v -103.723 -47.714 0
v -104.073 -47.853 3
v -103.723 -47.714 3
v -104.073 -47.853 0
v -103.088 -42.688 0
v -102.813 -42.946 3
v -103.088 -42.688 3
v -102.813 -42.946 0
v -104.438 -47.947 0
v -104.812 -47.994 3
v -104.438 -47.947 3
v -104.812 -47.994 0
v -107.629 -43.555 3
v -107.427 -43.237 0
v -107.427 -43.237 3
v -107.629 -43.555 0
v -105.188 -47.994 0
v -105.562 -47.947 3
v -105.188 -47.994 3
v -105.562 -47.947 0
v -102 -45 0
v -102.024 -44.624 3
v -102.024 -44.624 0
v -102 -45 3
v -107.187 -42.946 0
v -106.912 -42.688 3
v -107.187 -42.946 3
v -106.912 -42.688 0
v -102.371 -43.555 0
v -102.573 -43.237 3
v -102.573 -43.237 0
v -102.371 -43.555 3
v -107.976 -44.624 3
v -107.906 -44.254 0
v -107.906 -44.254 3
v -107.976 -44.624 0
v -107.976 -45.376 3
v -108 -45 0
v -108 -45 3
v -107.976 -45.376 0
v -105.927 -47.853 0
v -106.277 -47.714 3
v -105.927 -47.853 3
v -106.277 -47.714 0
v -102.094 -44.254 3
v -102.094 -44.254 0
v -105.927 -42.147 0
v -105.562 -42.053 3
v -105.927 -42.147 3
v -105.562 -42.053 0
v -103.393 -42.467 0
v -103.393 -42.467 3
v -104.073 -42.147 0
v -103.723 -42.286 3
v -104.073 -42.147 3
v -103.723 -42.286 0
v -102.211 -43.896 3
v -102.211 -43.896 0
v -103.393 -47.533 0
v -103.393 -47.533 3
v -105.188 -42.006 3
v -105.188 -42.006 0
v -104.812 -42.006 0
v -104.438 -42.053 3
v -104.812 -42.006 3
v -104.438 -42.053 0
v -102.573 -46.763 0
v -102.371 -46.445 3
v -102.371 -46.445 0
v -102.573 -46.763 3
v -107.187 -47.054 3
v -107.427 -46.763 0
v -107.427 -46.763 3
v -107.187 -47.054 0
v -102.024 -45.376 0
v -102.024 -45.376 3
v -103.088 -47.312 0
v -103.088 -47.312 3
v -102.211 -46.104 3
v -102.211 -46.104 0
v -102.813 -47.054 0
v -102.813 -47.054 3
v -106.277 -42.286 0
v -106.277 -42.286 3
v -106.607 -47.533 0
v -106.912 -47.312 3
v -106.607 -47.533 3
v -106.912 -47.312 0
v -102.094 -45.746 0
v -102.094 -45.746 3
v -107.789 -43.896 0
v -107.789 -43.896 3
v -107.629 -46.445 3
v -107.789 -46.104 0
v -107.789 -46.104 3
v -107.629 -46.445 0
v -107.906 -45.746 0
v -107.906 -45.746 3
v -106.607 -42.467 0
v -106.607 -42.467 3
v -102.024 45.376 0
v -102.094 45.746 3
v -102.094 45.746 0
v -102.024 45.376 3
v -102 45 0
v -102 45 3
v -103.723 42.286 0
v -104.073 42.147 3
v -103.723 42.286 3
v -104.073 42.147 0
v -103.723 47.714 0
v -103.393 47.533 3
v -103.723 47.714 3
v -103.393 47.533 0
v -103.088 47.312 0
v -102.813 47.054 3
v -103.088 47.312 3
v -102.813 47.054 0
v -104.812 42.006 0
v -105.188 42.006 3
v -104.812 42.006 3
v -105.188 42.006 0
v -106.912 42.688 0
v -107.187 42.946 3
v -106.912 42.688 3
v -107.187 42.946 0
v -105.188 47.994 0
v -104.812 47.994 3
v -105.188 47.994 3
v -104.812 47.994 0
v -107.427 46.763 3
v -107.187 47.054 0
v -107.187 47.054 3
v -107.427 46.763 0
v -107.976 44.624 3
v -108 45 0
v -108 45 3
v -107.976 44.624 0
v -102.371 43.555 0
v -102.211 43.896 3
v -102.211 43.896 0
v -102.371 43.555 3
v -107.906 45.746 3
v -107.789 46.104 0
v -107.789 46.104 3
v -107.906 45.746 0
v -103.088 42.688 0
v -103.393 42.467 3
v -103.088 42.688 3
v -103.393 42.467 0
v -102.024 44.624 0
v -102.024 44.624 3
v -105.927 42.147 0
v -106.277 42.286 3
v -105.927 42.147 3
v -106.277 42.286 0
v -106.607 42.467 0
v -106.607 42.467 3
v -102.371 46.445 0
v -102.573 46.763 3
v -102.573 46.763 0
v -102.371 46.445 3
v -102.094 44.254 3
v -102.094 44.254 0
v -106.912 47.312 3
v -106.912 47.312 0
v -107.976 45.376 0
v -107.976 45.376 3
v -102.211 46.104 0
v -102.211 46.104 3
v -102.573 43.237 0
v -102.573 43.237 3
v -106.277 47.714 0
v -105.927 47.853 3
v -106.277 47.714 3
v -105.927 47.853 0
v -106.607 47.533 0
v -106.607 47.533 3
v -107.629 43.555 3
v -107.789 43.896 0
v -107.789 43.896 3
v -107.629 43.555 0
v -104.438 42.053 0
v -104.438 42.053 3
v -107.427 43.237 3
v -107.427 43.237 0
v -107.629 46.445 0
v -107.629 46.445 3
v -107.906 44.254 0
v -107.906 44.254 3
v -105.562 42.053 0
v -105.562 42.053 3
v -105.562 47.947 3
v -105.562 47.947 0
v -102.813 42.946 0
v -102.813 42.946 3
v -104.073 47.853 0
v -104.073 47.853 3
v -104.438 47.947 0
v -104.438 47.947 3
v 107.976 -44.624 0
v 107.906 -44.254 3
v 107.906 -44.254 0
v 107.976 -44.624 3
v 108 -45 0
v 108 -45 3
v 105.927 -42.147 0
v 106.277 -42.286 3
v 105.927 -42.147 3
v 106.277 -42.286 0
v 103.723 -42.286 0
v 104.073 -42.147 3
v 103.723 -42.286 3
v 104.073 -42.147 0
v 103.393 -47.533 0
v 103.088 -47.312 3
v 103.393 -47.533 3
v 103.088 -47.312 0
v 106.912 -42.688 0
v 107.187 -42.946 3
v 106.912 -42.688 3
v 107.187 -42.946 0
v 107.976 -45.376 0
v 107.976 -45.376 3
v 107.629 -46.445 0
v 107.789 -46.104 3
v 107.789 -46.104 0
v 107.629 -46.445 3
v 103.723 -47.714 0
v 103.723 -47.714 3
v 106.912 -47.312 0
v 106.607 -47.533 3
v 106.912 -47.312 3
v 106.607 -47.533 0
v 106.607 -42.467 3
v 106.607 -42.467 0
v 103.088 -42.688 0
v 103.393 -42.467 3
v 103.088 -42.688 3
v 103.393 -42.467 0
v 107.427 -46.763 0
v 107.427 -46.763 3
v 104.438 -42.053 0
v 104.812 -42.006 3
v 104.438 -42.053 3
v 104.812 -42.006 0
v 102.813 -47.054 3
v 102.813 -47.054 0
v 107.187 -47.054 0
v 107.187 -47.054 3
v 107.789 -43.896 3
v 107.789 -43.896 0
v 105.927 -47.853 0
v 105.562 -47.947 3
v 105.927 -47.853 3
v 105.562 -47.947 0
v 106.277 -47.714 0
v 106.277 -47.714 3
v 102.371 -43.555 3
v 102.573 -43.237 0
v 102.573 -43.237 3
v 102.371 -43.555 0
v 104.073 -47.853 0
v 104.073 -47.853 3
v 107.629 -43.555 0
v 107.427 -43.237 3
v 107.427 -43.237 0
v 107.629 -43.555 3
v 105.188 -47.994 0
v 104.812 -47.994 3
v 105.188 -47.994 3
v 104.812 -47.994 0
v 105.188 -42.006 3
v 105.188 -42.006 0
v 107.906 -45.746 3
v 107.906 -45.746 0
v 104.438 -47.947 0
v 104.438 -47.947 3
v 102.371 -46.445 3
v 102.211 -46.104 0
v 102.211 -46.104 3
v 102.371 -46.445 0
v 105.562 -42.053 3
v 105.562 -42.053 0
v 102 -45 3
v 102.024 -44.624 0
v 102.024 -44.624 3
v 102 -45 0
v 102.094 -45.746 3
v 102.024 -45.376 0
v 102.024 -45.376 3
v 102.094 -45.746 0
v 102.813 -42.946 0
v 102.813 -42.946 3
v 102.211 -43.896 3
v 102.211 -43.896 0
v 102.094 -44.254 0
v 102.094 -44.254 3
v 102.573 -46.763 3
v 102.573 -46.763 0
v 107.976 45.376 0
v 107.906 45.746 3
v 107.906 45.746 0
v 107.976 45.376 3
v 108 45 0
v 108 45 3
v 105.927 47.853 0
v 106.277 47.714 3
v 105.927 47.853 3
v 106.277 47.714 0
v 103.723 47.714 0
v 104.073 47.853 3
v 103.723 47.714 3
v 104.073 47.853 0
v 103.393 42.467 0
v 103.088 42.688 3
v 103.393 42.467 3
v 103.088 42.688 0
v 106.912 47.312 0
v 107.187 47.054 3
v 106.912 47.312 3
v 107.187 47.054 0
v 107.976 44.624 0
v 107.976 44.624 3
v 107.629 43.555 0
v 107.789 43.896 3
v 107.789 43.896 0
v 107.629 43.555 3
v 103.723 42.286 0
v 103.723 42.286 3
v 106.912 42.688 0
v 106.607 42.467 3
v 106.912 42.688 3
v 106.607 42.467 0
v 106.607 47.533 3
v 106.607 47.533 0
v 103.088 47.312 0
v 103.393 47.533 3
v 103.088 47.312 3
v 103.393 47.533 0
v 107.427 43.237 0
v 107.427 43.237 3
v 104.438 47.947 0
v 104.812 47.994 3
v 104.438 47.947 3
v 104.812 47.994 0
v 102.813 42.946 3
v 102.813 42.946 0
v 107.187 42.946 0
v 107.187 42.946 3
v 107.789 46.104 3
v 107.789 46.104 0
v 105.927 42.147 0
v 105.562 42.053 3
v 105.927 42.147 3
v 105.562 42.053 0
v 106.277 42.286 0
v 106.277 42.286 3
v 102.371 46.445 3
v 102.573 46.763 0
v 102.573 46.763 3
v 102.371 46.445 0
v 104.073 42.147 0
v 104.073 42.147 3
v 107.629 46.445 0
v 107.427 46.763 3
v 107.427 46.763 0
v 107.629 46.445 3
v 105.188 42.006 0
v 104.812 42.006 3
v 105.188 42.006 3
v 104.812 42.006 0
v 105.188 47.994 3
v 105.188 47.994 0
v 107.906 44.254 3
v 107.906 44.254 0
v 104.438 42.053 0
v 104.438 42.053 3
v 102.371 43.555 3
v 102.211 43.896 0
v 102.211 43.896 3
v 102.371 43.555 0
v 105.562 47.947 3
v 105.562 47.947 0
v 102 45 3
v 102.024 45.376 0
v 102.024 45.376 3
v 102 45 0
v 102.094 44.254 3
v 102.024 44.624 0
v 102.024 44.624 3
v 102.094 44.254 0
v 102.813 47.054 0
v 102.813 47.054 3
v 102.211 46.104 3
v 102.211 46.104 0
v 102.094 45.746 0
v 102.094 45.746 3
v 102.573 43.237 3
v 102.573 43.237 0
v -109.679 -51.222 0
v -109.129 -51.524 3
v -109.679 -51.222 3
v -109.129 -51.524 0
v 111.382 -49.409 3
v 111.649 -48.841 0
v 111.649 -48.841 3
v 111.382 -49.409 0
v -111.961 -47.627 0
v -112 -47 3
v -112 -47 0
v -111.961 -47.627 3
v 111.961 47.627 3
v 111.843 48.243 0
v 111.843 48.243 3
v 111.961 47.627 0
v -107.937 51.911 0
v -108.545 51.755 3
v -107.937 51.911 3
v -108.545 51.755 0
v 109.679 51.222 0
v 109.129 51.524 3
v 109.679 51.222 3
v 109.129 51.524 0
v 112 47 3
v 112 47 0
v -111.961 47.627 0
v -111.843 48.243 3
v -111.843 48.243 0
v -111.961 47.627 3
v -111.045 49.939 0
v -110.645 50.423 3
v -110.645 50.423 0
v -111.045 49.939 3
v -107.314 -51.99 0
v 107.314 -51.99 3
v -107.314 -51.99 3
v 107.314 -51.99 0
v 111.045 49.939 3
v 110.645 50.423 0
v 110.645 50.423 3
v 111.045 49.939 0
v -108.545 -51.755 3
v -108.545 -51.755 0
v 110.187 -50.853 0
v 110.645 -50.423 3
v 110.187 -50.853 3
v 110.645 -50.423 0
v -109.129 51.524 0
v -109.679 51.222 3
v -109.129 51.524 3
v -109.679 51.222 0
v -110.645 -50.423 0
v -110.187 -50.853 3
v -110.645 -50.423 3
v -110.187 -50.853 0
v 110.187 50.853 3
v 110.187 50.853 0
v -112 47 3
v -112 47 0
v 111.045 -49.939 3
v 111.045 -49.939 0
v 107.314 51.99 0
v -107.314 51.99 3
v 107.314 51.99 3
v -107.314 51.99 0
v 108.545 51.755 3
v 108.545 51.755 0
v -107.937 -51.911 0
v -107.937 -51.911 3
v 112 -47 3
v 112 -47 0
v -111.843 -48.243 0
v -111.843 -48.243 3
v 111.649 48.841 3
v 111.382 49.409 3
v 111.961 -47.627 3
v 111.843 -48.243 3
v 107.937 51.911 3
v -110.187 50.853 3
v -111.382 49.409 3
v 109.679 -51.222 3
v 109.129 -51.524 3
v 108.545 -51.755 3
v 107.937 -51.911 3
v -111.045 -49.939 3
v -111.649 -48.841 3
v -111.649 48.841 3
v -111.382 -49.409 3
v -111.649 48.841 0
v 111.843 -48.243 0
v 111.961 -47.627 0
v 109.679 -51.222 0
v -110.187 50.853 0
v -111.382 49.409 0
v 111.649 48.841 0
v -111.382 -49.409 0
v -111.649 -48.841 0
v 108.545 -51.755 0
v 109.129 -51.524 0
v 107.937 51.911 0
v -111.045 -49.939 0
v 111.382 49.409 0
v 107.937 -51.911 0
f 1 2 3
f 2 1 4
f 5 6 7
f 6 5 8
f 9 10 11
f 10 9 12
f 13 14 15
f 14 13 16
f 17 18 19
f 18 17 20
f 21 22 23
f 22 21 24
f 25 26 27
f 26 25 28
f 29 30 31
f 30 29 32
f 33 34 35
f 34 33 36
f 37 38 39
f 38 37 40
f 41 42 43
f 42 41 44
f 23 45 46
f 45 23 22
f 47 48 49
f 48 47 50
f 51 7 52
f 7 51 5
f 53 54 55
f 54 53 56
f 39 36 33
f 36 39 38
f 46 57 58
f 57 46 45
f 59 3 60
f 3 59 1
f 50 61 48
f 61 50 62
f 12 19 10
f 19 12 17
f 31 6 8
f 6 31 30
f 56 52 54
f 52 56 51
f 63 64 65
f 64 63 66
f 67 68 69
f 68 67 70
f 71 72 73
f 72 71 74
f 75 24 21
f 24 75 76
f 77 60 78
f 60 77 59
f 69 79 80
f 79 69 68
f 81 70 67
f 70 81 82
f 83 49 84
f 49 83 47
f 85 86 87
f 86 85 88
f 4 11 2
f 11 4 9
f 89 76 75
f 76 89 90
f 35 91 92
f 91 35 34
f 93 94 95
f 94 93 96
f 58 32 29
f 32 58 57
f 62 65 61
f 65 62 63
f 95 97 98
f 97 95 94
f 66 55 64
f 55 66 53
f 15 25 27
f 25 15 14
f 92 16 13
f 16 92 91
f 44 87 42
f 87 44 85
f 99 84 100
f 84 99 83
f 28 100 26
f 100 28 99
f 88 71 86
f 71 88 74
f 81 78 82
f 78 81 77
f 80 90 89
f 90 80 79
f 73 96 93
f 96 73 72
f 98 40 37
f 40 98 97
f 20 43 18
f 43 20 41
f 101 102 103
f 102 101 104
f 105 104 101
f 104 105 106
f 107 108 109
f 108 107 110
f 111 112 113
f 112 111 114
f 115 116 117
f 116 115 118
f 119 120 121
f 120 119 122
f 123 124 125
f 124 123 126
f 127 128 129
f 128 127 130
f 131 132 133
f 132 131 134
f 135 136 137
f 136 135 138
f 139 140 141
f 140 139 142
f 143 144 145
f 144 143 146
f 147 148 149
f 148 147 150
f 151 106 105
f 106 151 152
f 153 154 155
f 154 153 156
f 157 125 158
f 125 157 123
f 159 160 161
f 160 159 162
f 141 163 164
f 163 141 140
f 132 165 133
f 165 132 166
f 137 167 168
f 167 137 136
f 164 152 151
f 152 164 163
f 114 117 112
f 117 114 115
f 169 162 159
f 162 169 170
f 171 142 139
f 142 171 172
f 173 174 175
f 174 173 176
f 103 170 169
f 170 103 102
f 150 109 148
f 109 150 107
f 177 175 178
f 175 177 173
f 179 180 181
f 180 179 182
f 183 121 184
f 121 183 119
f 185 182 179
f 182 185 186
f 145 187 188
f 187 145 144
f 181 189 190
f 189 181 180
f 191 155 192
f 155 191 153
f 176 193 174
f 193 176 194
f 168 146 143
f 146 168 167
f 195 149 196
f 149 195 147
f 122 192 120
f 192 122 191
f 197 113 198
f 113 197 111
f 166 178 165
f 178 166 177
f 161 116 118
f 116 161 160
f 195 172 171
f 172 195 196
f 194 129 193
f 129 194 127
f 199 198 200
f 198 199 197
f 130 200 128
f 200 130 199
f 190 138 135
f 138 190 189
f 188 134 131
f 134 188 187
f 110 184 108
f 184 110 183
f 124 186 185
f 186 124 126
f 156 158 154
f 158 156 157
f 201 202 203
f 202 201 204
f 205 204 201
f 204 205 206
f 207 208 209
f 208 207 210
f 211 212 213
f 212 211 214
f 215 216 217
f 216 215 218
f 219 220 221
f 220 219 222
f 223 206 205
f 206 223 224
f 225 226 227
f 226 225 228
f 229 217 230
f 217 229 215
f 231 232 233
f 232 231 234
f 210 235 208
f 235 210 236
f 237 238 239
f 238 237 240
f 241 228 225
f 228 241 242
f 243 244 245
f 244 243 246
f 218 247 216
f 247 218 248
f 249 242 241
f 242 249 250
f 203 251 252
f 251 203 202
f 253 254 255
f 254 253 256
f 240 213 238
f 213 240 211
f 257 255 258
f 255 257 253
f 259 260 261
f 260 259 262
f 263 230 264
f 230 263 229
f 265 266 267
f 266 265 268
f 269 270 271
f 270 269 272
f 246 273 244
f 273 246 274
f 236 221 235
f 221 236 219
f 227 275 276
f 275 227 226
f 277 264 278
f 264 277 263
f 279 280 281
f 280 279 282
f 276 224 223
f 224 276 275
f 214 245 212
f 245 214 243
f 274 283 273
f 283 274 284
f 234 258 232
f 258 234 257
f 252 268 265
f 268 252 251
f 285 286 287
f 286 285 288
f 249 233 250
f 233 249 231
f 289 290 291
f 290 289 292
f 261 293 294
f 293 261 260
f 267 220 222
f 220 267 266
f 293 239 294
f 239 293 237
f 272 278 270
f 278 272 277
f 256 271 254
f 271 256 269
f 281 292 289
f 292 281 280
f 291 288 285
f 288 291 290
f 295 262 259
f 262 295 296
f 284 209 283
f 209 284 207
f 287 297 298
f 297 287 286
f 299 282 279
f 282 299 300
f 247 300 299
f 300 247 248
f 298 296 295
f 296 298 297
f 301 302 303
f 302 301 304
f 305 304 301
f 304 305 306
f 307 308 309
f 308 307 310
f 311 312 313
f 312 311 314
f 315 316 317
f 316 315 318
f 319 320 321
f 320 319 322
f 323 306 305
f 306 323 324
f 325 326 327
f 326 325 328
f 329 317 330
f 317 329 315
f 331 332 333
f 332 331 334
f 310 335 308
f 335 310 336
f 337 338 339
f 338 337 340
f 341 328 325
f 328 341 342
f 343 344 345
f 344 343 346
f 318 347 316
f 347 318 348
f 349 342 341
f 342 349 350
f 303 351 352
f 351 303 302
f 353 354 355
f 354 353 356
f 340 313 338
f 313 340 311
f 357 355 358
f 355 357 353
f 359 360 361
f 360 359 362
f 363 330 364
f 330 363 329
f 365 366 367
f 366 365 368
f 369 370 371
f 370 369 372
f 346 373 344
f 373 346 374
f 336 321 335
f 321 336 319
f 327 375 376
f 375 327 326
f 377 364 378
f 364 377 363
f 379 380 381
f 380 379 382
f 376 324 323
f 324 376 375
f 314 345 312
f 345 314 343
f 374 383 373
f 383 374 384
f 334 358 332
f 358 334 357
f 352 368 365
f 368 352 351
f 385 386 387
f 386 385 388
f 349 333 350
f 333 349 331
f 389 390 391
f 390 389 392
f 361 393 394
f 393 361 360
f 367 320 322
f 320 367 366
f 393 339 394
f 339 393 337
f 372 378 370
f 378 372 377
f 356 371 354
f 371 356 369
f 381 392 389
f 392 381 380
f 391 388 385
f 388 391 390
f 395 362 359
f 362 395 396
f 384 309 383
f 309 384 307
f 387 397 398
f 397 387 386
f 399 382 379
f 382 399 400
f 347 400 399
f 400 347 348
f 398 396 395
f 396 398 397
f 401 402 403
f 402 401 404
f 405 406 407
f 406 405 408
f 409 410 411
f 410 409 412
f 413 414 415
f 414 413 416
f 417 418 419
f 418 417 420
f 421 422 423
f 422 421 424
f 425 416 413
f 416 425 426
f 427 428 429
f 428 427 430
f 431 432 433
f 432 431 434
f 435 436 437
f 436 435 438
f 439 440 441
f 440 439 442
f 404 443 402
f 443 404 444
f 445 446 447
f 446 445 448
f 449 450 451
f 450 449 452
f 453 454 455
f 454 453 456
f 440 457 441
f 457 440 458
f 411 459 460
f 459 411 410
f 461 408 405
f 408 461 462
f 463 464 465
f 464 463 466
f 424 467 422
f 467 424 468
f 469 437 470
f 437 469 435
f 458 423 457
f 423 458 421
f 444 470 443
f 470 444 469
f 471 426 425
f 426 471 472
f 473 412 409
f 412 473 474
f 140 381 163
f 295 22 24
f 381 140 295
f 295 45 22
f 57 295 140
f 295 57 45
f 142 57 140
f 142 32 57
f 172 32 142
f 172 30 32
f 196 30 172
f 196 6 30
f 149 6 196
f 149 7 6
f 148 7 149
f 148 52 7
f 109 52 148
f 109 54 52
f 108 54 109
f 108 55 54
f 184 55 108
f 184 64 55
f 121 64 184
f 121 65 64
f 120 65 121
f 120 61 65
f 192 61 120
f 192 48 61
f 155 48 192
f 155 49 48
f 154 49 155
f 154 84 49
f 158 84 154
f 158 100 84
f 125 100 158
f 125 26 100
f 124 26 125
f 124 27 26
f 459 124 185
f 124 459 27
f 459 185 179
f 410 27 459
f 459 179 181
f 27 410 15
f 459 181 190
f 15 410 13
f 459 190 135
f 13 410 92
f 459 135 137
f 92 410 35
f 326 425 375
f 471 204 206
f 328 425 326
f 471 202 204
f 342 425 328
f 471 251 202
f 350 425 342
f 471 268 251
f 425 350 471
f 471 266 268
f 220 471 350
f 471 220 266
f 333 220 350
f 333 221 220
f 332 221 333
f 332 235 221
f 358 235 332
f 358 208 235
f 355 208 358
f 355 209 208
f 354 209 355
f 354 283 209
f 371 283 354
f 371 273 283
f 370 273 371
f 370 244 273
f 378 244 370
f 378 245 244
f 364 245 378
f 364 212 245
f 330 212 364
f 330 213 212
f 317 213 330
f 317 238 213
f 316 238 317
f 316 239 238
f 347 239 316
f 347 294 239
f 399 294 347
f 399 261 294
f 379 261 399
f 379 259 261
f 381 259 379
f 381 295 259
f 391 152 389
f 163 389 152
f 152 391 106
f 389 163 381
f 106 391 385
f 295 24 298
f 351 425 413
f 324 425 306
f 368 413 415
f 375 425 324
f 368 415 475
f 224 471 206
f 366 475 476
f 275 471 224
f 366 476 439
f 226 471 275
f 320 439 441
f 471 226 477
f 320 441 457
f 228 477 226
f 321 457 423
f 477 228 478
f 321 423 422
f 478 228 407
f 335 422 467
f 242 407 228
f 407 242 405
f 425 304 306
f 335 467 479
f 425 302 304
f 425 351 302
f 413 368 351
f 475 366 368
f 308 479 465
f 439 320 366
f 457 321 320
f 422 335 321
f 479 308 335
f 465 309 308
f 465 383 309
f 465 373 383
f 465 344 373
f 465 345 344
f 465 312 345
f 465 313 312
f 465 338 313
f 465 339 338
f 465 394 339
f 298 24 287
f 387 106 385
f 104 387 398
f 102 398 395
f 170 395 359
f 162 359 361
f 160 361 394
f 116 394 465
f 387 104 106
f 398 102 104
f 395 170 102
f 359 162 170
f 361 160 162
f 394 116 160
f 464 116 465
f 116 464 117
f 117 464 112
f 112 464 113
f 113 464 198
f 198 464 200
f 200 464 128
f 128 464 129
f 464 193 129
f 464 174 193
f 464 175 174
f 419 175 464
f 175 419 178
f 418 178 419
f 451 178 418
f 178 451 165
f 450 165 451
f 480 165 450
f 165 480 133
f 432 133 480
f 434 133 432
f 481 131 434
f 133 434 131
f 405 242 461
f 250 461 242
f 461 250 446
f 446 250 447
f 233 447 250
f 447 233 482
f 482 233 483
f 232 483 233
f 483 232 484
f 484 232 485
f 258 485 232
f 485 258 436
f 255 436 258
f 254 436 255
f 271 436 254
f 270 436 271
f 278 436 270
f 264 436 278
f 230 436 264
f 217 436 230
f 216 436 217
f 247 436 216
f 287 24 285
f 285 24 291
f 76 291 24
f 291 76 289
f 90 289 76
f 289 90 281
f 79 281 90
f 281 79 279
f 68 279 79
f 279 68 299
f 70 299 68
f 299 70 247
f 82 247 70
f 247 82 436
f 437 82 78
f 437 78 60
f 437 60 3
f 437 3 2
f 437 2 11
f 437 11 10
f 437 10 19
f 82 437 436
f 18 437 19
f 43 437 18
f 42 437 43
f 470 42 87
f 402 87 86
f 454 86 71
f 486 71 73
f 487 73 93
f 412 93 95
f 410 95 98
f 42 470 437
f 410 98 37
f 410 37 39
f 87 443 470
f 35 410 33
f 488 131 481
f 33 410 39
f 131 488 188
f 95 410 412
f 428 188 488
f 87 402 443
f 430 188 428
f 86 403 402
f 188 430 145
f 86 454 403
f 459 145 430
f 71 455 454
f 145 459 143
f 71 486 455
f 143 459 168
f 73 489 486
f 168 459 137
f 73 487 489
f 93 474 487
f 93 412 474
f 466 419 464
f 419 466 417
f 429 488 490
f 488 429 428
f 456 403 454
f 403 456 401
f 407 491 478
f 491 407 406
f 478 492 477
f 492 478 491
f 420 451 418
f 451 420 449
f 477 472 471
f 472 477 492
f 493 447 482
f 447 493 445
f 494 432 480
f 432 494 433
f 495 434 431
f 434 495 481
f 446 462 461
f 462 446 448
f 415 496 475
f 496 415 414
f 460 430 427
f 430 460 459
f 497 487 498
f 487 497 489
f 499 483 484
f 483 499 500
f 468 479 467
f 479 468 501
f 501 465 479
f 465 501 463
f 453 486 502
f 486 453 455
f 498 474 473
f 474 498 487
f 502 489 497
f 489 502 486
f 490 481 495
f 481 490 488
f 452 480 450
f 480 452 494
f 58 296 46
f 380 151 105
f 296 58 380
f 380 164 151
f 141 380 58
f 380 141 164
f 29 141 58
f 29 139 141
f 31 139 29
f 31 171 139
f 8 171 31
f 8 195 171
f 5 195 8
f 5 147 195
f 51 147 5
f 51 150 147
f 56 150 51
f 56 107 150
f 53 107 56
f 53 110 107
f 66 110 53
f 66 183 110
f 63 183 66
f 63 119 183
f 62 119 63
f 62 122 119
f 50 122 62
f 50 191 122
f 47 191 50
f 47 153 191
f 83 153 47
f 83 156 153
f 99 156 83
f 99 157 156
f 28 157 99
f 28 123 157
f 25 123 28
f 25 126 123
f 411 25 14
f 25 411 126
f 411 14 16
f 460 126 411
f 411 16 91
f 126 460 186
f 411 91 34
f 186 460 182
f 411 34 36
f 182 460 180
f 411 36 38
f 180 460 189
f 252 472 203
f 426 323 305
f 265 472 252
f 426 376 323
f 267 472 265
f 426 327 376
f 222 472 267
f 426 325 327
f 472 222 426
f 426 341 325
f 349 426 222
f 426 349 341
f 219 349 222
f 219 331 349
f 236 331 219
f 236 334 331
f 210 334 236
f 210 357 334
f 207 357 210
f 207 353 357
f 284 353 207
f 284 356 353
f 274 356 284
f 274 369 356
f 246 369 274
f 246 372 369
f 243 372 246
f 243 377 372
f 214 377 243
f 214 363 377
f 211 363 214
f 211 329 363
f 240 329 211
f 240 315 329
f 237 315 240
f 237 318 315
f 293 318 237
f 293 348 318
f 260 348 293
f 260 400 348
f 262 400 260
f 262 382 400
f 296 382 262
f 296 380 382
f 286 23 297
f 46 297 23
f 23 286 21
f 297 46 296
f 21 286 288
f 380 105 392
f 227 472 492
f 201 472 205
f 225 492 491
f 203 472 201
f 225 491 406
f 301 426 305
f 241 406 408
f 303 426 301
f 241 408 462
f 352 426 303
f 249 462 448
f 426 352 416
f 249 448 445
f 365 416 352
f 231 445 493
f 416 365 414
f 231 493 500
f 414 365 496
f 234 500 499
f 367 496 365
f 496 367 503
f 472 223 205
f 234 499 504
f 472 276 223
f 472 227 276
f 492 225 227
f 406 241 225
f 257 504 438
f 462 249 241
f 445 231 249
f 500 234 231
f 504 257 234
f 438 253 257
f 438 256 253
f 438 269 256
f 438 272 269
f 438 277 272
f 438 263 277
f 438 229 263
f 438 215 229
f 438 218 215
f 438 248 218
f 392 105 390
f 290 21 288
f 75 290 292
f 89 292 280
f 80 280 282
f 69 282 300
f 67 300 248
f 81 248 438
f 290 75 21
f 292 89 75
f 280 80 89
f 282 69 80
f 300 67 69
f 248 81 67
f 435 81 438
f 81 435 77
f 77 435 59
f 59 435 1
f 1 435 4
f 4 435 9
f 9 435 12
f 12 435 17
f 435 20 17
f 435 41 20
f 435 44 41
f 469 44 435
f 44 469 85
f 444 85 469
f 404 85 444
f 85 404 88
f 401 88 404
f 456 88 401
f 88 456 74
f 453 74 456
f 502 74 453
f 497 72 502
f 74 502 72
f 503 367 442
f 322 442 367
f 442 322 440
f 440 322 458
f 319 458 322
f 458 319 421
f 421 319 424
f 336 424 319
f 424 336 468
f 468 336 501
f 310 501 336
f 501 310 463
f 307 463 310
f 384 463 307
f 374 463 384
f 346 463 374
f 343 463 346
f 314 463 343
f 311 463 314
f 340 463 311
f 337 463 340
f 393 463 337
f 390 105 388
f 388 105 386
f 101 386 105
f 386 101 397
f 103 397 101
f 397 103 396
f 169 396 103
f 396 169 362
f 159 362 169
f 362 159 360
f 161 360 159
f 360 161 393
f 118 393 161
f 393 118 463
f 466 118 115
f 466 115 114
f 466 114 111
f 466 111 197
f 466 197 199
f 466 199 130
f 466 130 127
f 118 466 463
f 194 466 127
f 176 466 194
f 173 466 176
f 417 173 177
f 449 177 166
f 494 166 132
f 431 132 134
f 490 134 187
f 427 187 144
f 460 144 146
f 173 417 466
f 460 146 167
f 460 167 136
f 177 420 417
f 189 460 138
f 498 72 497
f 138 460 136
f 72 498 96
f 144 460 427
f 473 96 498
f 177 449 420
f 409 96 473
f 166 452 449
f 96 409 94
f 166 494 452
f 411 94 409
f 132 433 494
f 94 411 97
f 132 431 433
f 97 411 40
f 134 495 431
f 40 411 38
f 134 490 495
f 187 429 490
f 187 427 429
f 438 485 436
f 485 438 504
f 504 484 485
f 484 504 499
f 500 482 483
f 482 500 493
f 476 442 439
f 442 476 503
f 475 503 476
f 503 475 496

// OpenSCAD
$fn = 50;


difference() {
	union() {
		hull() {
			translate(v = [-107.0000000000, 47.0000000000, 0]) {
				cylinder(h = 3, r = 5);
			}
			translate(v = [107.0000000000, 47.0000000000, 0]) {
				cylinder(h = 3, r = 5);
			}
			translate(v = [-107.0000000000, -47.0000000000, 0]) {
				cylinder(h = 3, r = 5);
			}
			translate(v = [107.0000000000, -47.0000000000, 0]) {
				cylinder(h = 3, r = 5);
			}
		}
	}
	union() {
		translate(v = [-105.0000000000, -45.0000000000, -100.0000000000]) {
			cylinder(h = 200, r = 3.0000000000);
		}
		translate(v = [-105.0000000000, 45.0000000000, -100.0000000000]) {
			cylinder(h = 200, r = 3.0000000000);
		}
		translate(v = [105.0000000000, -45.0000000000, -100.0000000000]) {
			cylinder(h = 200, r = 3.0000000000);
		}
		translate(v = [105.0000000000, 45.0000000000, -100.0000000000]) {
			cylinder(h = 200, r = 3.0000000000);
		}
	}
}
